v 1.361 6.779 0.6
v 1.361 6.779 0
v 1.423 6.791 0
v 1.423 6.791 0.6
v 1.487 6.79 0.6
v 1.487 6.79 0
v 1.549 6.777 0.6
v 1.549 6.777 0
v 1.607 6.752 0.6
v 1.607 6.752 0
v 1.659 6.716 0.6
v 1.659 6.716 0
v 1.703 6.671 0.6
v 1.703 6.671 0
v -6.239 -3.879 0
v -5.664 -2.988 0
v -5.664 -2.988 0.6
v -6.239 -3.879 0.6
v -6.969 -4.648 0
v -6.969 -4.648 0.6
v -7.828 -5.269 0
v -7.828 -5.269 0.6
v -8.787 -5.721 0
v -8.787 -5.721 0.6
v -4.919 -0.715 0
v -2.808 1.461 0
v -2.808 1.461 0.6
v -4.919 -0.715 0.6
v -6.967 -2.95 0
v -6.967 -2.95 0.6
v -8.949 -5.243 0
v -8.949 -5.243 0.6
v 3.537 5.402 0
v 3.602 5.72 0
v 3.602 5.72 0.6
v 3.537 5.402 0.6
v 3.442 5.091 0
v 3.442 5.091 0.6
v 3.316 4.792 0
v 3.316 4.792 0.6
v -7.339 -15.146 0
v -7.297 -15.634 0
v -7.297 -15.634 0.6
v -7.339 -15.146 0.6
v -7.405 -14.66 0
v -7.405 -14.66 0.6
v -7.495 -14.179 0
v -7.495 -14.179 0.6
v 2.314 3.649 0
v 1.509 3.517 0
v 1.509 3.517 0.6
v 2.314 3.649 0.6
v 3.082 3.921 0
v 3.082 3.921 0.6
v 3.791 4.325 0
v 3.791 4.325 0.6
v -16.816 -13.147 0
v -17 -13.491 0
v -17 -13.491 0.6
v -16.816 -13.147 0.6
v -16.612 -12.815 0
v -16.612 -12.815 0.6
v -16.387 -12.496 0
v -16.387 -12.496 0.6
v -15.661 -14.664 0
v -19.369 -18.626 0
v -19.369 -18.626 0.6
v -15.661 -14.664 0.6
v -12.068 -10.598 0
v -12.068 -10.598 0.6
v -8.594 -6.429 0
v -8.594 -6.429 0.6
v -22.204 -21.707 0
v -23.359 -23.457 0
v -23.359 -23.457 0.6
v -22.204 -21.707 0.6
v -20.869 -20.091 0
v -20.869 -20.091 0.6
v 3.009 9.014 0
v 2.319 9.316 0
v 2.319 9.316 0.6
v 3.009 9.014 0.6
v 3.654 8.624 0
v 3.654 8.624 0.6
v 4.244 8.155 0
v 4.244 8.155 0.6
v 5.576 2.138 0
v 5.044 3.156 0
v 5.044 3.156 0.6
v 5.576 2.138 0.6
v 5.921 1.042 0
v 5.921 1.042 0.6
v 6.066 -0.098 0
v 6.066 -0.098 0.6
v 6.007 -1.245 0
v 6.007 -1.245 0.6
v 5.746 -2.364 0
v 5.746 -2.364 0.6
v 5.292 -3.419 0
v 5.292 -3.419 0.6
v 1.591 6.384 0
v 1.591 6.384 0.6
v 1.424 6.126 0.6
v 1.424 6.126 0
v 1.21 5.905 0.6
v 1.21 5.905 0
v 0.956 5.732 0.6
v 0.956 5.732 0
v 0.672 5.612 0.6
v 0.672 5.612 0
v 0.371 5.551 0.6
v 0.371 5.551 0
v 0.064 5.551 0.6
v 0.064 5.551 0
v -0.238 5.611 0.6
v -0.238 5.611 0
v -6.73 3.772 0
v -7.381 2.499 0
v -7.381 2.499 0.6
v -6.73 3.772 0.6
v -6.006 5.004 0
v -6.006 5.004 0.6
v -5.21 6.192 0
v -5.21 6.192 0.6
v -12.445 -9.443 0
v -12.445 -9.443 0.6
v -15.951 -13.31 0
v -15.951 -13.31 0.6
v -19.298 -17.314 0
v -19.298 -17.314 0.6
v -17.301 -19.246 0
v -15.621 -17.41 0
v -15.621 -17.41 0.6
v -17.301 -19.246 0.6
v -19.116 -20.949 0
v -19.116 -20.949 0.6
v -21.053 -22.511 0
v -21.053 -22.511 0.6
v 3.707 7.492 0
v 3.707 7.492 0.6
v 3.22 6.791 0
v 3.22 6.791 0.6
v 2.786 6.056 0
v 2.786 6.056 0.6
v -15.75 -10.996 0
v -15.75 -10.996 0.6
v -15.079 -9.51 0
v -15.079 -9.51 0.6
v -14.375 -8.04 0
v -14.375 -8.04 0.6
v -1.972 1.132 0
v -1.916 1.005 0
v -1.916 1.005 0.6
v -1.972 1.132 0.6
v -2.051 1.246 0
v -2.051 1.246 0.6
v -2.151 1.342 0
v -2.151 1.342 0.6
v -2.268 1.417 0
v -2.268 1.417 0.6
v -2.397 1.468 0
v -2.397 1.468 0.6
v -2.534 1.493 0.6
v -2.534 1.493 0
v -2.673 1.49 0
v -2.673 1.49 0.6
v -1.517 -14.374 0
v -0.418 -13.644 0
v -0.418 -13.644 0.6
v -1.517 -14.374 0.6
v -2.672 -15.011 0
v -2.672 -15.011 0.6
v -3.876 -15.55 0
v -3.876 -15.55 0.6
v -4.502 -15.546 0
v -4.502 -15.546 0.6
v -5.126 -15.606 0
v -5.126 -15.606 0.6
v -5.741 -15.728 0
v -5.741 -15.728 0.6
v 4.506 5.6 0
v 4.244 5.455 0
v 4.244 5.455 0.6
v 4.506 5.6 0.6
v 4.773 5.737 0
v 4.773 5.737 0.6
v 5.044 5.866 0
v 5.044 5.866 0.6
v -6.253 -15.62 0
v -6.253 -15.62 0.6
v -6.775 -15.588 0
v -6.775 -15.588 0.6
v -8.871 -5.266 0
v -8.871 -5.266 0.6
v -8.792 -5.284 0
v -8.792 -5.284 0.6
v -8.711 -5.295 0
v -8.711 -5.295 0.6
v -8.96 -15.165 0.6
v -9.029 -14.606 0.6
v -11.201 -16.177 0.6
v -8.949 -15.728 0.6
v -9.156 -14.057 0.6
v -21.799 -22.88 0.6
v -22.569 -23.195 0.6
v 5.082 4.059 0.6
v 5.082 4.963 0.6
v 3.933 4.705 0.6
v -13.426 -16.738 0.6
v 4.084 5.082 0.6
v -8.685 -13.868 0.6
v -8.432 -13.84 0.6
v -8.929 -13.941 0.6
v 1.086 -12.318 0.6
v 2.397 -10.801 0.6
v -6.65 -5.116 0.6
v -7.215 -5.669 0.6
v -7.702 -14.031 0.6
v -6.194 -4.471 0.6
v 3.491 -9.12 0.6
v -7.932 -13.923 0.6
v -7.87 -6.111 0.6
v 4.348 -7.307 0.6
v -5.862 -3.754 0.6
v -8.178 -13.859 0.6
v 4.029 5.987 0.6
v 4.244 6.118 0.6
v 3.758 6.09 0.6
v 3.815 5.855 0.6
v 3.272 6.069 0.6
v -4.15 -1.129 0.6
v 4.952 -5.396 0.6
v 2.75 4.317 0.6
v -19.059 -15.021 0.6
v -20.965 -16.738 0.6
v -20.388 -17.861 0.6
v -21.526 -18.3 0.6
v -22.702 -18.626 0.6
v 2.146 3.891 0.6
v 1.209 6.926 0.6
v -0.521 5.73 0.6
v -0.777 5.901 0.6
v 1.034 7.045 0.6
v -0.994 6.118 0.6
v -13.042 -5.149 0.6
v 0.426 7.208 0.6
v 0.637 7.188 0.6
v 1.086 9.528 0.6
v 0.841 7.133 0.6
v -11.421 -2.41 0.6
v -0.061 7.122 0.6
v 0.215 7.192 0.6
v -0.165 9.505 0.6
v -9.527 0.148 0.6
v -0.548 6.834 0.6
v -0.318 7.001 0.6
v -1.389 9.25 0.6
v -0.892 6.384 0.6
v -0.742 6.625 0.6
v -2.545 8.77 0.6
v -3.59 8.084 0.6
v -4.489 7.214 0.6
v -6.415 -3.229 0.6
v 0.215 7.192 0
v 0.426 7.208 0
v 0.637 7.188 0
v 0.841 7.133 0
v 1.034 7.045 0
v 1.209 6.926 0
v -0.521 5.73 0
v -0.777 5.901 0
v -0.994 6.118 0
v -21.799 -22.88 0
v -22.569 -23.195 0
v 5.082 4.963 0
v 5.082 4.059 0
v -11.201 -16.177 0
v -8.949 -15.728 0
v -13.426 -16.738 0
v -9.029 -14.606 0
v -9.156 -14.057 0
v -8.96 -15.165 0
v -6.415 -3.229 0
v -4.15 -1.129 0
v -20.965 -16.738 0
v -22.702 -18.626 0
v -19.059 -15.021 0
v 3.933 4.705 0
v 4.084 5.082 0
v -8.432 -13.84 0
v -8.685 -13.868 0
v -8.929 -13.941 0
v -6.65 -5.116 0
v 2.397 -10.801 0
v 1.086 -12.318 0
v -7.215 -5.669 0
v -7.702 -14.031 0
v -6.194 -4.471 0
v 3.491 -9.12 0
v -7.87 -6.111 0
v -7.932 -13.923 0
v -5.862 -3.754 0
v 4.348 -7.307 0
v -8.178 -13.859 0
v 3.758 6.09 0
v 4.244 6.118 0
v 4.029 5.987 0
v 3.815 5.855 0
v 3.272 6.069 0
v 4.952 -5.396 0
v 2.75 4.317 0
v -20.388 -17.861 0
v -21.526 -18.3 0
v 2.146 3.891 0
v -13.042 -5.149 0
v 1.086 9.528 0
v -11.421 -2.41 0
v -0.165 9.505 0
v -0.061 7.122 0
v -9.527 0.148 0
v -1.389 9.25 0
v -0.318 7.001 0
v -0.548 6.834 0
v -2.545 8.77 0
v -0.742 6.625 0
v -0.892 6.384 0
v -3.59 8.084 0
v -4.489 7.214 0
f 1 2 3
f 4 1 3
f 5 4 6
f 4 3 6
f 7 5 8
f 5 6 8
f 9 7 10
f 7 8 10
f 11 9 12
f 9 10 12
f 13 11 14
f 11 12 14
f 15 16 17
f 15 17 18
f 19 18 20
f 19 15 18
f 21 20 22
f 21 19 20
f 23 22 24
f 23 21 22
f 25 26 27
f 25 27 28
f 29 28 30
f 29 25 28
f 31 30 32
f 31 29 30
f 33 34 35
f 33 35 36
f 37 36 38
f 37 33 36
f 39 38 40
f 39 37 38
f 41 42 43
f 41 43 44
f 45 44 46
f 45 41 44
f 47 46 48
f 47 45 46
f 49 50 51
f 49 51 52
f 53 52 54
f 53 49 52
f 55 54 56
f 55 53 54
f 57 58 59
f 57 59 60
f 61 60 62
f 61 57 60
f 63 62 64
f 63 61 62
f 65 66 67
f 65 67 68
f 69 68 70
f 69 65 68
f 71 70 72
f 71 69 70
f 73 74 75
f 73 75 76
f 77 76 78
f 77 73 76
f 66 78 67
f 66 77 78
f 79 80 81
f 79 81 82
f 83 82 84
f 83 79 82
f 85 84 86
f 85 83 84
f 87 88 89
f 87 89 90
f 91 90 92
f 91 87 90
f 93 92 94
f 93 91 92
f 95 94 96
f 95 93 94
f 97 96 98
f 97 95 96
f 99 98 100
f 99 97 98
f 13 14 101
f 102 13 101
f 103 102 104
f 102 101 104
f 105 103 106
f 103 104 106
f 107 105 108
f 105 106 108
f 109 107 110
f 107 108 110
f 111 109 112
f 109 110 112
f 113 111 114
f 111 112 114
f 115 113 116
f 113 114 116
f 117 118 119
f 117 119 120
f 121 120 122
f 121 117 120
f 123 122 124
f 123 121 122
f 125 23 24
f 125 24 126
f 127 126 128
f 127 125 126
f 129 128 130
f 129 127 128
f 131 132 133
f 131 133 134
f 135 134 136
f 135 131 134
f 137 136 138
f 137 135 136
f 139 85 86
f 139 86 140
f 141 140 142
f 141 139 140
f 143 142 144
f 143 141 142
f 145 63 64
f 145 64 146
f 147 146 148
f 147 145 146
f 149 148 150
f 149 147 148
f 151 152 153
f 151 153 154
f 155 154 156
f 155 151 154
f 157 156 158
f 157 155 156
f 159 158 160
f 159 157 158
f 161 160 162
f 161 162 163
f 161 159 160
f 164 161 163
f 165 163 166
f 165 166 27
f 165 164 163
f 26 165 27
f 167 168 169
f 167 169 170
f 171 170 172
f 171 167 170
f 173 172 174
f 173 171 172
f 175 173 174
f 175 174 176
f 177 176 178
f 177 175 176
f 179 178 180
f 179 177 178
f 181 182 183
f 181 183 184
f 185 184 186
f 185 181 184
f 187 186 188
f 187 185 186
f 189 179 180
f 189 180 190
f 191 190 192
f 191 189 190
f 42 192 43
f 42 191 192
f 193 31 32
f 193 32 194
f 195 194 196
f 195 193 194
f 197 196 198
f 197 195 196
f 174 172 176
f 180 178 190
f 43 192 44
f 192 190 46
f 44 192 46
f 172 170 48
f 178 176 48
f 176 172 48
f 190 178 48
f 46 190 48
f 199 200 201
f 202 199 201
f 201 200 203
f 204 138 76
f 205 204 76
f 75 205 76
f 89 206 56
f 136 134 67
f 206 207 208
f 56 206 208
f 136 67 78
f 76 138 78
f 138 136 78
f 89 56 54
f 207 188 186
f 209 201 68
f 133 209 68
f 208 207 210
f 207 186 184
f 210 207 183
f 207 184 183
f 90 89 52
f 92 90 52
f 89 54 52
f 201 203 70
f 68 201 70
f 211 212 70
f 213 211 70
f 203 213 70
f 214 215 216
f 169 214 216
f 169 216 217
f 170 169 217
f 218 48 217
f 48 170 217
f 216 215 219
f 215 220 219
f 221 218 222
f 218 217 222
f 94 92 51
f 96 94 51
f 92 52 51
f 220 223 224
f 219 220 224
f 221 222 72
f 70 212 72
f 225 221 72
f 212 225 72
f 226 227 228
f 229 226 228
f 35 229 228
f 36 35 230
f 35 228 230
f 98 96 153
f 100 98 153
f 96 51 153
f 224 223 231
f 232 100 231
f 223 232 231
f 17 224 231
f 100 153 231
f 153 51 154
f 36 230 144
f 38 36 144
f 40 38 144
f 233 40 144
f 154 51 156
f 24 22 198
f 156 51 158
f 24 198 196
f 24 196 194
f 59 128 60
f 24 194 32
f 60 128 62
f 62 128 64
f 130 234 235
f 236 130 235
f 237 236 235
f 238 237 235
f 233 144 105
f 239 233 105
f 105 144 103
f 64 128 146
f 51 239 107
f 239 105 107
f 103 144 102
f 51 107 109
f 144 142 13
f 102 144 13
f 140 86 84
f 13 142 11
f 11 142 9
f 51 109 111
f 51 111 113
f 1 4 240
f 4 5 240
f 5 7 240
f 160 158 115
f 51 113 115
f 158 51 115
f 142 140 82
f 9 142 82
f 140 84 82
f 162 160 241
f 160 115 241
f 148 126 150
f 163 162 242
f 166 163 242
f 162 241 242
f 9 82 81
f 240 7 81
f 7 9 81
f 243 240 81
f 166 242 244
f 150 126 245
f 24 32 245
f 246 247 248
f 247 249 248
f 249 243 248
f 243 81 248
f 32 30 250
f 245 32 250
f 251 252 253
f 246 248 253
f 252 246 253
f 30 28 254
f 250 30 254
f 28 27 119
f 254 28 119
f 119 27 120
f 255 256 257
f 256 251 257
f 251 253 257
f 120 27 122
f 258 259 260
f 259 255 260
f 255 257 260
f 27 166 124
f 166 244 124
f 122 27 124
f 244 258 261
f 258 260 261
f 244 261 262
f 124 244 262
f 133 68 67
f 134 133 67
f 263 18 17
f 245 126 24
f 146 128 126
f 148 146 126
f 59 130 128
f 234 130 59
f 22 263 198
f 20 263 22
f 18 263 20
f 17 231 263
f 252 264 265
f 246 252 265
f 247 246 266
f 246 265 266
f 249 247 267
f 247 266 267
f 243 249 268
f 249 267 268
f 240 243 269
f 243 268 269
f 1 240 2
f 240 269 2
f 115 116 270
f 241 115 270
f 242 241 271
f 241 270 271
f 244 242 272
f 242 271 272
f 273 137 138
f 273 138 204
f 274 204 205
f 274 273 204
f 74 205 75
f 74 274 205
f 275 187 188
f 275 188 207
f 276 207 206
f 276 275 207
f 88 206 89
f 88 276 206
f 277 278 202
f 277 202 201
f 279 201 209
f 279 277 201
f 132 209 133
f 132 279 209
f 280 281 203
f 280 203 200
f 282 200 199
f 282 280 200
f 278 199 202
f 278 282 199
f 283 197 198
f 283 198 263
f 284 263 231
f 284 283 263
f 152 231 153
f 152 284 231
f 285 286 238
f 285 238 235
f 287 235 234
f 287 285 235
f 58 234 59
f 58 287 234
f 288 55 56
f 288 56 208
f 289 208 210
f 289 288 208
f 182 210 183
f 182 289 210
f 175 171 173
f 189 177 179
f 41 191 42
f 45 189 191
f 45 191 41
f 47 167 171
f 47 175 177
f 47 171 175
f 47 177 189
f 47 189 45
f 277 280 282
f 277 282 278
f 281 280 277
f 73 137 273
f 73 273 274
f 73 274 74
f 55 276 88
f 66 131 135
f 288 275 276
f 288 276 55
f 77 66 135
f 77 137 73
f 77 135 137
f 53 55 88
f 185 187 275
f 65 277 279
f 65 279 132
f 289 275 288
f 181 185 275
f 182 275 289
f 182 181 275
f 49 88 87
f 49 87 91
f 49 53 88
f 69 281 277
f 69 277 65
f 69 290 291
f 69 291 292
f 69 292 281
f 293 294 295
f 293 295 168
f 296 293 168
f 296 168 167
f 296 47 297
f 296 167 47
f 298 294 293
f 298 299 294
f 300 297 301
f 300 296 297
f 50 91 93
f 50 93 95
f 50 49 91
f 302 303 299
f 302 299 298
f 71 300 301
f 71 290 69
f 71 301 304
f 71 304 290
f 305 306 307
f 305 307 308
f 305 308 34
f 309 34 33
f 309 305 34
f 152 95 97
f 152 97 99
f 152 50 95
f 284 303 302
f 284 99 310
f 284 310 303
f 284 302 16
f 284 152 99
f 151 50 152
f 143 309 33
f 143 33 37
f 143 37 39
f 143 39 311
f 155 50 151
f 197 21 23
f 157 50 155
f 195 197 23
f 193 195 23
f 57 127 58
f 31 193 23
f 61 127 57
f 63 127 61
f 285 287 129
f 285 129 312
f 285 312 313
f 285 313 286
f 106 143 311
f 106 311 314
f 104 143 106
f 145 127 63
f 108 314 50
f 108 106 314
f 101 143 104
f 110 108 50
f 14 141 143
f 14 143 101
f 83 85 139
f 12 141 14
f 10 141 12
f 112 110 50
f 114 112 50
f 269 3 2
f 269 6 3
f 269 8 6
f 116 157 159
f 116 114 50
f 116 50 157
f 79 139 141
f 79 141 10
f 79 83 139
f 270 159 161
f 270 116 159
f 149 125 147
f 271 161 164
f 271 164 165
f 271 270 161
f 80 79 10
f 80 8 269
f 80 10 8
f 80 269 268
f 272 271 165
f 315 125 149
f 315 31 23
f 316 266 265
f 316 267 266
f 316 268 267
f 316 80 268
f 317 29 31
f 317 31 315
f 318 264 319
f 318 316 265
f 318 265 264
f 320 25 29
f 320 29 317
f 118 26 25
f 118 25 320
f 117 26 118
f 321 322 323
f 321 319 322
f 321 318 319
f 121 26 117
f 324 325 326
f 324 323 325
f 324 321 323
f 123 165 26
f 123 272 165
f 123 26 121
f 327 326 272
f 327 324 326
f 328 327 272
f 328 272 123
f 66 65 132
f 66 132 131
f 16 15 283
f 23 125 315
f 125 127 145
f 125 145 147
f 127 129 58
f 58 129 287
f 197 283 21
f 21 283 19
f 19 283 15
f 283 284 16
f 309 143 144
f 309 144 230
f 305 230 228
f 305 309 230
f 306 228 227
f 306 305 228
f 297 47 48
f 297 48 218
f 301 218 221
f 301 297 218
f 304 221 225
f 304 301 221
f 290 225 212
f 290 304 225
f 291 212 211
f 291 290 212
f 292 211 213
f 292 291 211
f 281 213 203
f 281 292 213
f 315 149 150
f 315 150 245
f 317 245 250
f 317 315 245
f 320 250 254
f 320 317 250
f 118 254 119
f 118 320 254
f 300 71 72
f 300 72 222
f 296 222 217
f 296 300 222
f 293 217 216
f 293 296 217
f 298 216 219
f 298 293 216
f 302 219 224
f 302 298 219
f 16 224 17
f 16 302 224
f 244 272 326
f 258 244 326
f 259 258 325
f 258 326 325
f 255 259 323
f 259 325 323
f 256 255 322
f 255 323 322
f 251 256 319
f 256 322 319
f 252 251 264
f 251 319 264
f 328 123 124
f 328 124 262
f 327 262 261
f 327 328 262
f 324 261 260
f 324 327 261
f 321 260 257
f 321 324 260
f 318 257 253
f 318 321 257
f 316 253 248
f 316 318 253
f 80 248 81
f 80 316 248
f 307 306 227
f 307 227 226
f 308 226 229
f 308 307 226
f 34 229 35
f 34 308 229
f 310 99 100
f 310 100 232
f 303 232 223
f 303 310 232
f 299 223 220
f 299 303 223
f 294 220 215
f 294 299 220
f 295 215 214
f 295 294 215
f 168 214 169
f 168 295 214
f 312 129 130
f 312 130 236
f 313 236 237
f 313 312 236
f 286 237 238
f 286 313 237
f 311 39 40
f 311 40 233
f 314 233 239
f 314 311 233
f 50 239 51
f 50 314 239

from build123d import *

# Parameters (mm, degrees)
EXTRUDE_1_DEPTH = 0.6


with BuildPart() as part:
    # 스케치1 → 보스-돌출1 (new body)
    with BuildSketch(Plane.XY):
        with BuildLine():
            ThreePointArc((4.243865228, 6.118140931), (3.92164821, 5.921191263), (3.601804057, 5.720411047))
            ThreePointArc((3.601804057, 5.720411047), (3.493384012, 5.24542324), (3.316336948, 4.791526049))
            ThreePointArc((3.316336948, 4.791526049), (2.452686661, 4.097818684), (1.509336268, 3.517119312))
            ThreePointArc((1.509336268, 3.517119312), (2.704109532, 3.767922564), (3.790546418, 4.324735205))
            ThreePointArc((3.790546418, 4.324735205), (4.007319334, 4.893950514), (4.243865228, 5.455237077))
            ThreePointArc((4.243865228, 5.455237077), (4.639299082, 5.669042259), (5.043553271, 5.865661533))
            ThreePointArc((5.043553271, 5.865661533), (5.086534646, 4.510854203), (5.043553271, 3.156046874))
            ThreePointArc((5.043553271, 3.156046874), (6.065944614, -0.097812915), (5.291753627, -3.419486575))
            ThreePointArc((5.291753627, -3.419486575), (3.490836657, -9.120276828), (-0.418085028, -13.643842092))
            ThreePointArc((-0.418085028, -13.643842092), (-2.087490816, -14.704669315), (-3.875685356, -15.550027444))
            ThreePointArc((-3.875685356, -15.550027444), (-4.814989199, -15.5684183), (-5.740747963, -15.728420312))
            ThreePointArc((-5.740747963, -15.728420312), (-6.513490531, -15.594064313), (-7.296832392, -15.633537604))
            ThreePointArc((-7.296832392, -15.633537604), (-7.368791385, -14.902567754), (-7.494700457, -14.178936686))
            ThreePointArc((-7.494700457, -14.178936686), (-8.304954519, -13.843397992), (-9.155598119, -14.056713079))
            ThreePointArc((-9.155598119, -14.056713079), (-8.9873833, -14.884534295), (-8.949428325, -15.728420312))
            ThreePointArc((-8.949428325, -15.728420312), (-12.316982906, -16.443277918), (-15.620992713, -17.410213517))
            ThreePointArc((-15.620992713, -17.410213517), (-18.192390504, -20.114679115), (-21.053078027, -22.511069665))
            ThreePointArc((-21.053078027, -22.511069665), (-22.181356159, -23.04421905), (-23.359176817, -23.456527561))
            ThreePointArc((-23.359176817, -23.456527561), (-21.55820937, -20.881039072), (-19.369361534, -18.625918265))
            ThreePointArc((-19.369361534, -18.625918265), (-13.849484699, -12.644014904), (-8.593743971, -6.428759681))
            ThreePointArc((-8.593743971, -6.428759681), (-6.650317937, -5.116178912), (-5.664079914, -2.988478841))
            ThreePointArc((-5.664079914, -2.988478841), (-6.968956966, -4.648017071), (-8.787254134, -5.720661777))
            ThreePointArc((-8.787254134, -5.720661777), (-14.217270083, -11.359132573), (-19.298032623, -17.314237787))
            ThreePointArc((-19.298032623, -17.314237787), (-20.952003277, -18.09423566), (-22.701668736, -18.625918265))
            ThreePointArc((-22.701668736, -18.625918265), (-20.032240522, -15.856920342), (-16.99977962, -13.491042629))
            ThreePointArc((-16.99977962, -13.491042629), (-16.716409139, -12.979319841), (-16.386941379, -12.49598762))
            ThreePointArc((-16.386941379, -12.49598762), (-15.418772116, -10.250862917), (-14.374813618, -8.039960994))
            ThreePointArc((-14.374813618, -8.039960994), (-11.420678404, -2.410213973), (-7.380723905, 2.498934021))
            ThreePointArc((-7.380723905, 2.498934021), (-6.377004033, 4.393223264), (-5.210202068, 6.191655495))
            ThreePointArc((-5.210202068, 6.191655495), (-1.978219396, 9.037163181), (2.318833307, 9.316383632))
            ThreePointArc((2.318833307, 9.316383632), (3.338100738, 8.829609856), (4.243865228, 8.154742835))
            ThreePointArc((4.243865228, 8.154742835), (3.456899221, 7.145606029), (2.786183745, 6.055737532))
            ThreePointArc((2.786183745, 6.055737532), (3.51538621, 6.078489728), (4.243865228, 6.118140931))
        make_face()
        with BuildLine():
            ThreePointArc((-2.808227805, 1.460594831), (-5.951081989, -1.825237175), (-8.949428325, -5.243444841))
            ThreePointArc((-8.949428325, -5.243444841), (-8.831818054, -5.27564433), (-8.711437416, -5.295073305))
            ThreePointArc((-8.711437416, -5.295073305), (-5.278864783, -2.182820323), (-1.91601492, 1.004641725))
            ThreePointArc((-1.91601492, 1.004641725), (-2.267690382, 1.417401617), (-2.808227805, 1.460594831))
        make_face(mode=Mode.SUBTRACT)
        with BuildLine():
            ThreePointArc((-0.993904208, 6.118140931), (-0.547936142, 6.833647448), (0.215079605, 7.192317298))
            ThreePointArc((0.215079605, 7.192317298), (0.841318807, 7.133240086), (1.361301437, 6.779285683))
            ThreePointArc((1.361301437, 6.779285683), (1.548522148, 6.776978051), (1.702780334, 6.670858627))
            ThreePointArc((1.702780334, 6.670858627), (0.955764837, 5.731971759), (-0.237955168, 5.611252025))
            ThreePointArc((-0.237955168, 5.611252025), (-0.653261747, 5.809021292), (-0.993904208, 6.118140931))
        make_face(mode=Mode.SUBTRACT)
    extrude(amount=EXTRUDE_1_DEPTH)


solid = part.part
